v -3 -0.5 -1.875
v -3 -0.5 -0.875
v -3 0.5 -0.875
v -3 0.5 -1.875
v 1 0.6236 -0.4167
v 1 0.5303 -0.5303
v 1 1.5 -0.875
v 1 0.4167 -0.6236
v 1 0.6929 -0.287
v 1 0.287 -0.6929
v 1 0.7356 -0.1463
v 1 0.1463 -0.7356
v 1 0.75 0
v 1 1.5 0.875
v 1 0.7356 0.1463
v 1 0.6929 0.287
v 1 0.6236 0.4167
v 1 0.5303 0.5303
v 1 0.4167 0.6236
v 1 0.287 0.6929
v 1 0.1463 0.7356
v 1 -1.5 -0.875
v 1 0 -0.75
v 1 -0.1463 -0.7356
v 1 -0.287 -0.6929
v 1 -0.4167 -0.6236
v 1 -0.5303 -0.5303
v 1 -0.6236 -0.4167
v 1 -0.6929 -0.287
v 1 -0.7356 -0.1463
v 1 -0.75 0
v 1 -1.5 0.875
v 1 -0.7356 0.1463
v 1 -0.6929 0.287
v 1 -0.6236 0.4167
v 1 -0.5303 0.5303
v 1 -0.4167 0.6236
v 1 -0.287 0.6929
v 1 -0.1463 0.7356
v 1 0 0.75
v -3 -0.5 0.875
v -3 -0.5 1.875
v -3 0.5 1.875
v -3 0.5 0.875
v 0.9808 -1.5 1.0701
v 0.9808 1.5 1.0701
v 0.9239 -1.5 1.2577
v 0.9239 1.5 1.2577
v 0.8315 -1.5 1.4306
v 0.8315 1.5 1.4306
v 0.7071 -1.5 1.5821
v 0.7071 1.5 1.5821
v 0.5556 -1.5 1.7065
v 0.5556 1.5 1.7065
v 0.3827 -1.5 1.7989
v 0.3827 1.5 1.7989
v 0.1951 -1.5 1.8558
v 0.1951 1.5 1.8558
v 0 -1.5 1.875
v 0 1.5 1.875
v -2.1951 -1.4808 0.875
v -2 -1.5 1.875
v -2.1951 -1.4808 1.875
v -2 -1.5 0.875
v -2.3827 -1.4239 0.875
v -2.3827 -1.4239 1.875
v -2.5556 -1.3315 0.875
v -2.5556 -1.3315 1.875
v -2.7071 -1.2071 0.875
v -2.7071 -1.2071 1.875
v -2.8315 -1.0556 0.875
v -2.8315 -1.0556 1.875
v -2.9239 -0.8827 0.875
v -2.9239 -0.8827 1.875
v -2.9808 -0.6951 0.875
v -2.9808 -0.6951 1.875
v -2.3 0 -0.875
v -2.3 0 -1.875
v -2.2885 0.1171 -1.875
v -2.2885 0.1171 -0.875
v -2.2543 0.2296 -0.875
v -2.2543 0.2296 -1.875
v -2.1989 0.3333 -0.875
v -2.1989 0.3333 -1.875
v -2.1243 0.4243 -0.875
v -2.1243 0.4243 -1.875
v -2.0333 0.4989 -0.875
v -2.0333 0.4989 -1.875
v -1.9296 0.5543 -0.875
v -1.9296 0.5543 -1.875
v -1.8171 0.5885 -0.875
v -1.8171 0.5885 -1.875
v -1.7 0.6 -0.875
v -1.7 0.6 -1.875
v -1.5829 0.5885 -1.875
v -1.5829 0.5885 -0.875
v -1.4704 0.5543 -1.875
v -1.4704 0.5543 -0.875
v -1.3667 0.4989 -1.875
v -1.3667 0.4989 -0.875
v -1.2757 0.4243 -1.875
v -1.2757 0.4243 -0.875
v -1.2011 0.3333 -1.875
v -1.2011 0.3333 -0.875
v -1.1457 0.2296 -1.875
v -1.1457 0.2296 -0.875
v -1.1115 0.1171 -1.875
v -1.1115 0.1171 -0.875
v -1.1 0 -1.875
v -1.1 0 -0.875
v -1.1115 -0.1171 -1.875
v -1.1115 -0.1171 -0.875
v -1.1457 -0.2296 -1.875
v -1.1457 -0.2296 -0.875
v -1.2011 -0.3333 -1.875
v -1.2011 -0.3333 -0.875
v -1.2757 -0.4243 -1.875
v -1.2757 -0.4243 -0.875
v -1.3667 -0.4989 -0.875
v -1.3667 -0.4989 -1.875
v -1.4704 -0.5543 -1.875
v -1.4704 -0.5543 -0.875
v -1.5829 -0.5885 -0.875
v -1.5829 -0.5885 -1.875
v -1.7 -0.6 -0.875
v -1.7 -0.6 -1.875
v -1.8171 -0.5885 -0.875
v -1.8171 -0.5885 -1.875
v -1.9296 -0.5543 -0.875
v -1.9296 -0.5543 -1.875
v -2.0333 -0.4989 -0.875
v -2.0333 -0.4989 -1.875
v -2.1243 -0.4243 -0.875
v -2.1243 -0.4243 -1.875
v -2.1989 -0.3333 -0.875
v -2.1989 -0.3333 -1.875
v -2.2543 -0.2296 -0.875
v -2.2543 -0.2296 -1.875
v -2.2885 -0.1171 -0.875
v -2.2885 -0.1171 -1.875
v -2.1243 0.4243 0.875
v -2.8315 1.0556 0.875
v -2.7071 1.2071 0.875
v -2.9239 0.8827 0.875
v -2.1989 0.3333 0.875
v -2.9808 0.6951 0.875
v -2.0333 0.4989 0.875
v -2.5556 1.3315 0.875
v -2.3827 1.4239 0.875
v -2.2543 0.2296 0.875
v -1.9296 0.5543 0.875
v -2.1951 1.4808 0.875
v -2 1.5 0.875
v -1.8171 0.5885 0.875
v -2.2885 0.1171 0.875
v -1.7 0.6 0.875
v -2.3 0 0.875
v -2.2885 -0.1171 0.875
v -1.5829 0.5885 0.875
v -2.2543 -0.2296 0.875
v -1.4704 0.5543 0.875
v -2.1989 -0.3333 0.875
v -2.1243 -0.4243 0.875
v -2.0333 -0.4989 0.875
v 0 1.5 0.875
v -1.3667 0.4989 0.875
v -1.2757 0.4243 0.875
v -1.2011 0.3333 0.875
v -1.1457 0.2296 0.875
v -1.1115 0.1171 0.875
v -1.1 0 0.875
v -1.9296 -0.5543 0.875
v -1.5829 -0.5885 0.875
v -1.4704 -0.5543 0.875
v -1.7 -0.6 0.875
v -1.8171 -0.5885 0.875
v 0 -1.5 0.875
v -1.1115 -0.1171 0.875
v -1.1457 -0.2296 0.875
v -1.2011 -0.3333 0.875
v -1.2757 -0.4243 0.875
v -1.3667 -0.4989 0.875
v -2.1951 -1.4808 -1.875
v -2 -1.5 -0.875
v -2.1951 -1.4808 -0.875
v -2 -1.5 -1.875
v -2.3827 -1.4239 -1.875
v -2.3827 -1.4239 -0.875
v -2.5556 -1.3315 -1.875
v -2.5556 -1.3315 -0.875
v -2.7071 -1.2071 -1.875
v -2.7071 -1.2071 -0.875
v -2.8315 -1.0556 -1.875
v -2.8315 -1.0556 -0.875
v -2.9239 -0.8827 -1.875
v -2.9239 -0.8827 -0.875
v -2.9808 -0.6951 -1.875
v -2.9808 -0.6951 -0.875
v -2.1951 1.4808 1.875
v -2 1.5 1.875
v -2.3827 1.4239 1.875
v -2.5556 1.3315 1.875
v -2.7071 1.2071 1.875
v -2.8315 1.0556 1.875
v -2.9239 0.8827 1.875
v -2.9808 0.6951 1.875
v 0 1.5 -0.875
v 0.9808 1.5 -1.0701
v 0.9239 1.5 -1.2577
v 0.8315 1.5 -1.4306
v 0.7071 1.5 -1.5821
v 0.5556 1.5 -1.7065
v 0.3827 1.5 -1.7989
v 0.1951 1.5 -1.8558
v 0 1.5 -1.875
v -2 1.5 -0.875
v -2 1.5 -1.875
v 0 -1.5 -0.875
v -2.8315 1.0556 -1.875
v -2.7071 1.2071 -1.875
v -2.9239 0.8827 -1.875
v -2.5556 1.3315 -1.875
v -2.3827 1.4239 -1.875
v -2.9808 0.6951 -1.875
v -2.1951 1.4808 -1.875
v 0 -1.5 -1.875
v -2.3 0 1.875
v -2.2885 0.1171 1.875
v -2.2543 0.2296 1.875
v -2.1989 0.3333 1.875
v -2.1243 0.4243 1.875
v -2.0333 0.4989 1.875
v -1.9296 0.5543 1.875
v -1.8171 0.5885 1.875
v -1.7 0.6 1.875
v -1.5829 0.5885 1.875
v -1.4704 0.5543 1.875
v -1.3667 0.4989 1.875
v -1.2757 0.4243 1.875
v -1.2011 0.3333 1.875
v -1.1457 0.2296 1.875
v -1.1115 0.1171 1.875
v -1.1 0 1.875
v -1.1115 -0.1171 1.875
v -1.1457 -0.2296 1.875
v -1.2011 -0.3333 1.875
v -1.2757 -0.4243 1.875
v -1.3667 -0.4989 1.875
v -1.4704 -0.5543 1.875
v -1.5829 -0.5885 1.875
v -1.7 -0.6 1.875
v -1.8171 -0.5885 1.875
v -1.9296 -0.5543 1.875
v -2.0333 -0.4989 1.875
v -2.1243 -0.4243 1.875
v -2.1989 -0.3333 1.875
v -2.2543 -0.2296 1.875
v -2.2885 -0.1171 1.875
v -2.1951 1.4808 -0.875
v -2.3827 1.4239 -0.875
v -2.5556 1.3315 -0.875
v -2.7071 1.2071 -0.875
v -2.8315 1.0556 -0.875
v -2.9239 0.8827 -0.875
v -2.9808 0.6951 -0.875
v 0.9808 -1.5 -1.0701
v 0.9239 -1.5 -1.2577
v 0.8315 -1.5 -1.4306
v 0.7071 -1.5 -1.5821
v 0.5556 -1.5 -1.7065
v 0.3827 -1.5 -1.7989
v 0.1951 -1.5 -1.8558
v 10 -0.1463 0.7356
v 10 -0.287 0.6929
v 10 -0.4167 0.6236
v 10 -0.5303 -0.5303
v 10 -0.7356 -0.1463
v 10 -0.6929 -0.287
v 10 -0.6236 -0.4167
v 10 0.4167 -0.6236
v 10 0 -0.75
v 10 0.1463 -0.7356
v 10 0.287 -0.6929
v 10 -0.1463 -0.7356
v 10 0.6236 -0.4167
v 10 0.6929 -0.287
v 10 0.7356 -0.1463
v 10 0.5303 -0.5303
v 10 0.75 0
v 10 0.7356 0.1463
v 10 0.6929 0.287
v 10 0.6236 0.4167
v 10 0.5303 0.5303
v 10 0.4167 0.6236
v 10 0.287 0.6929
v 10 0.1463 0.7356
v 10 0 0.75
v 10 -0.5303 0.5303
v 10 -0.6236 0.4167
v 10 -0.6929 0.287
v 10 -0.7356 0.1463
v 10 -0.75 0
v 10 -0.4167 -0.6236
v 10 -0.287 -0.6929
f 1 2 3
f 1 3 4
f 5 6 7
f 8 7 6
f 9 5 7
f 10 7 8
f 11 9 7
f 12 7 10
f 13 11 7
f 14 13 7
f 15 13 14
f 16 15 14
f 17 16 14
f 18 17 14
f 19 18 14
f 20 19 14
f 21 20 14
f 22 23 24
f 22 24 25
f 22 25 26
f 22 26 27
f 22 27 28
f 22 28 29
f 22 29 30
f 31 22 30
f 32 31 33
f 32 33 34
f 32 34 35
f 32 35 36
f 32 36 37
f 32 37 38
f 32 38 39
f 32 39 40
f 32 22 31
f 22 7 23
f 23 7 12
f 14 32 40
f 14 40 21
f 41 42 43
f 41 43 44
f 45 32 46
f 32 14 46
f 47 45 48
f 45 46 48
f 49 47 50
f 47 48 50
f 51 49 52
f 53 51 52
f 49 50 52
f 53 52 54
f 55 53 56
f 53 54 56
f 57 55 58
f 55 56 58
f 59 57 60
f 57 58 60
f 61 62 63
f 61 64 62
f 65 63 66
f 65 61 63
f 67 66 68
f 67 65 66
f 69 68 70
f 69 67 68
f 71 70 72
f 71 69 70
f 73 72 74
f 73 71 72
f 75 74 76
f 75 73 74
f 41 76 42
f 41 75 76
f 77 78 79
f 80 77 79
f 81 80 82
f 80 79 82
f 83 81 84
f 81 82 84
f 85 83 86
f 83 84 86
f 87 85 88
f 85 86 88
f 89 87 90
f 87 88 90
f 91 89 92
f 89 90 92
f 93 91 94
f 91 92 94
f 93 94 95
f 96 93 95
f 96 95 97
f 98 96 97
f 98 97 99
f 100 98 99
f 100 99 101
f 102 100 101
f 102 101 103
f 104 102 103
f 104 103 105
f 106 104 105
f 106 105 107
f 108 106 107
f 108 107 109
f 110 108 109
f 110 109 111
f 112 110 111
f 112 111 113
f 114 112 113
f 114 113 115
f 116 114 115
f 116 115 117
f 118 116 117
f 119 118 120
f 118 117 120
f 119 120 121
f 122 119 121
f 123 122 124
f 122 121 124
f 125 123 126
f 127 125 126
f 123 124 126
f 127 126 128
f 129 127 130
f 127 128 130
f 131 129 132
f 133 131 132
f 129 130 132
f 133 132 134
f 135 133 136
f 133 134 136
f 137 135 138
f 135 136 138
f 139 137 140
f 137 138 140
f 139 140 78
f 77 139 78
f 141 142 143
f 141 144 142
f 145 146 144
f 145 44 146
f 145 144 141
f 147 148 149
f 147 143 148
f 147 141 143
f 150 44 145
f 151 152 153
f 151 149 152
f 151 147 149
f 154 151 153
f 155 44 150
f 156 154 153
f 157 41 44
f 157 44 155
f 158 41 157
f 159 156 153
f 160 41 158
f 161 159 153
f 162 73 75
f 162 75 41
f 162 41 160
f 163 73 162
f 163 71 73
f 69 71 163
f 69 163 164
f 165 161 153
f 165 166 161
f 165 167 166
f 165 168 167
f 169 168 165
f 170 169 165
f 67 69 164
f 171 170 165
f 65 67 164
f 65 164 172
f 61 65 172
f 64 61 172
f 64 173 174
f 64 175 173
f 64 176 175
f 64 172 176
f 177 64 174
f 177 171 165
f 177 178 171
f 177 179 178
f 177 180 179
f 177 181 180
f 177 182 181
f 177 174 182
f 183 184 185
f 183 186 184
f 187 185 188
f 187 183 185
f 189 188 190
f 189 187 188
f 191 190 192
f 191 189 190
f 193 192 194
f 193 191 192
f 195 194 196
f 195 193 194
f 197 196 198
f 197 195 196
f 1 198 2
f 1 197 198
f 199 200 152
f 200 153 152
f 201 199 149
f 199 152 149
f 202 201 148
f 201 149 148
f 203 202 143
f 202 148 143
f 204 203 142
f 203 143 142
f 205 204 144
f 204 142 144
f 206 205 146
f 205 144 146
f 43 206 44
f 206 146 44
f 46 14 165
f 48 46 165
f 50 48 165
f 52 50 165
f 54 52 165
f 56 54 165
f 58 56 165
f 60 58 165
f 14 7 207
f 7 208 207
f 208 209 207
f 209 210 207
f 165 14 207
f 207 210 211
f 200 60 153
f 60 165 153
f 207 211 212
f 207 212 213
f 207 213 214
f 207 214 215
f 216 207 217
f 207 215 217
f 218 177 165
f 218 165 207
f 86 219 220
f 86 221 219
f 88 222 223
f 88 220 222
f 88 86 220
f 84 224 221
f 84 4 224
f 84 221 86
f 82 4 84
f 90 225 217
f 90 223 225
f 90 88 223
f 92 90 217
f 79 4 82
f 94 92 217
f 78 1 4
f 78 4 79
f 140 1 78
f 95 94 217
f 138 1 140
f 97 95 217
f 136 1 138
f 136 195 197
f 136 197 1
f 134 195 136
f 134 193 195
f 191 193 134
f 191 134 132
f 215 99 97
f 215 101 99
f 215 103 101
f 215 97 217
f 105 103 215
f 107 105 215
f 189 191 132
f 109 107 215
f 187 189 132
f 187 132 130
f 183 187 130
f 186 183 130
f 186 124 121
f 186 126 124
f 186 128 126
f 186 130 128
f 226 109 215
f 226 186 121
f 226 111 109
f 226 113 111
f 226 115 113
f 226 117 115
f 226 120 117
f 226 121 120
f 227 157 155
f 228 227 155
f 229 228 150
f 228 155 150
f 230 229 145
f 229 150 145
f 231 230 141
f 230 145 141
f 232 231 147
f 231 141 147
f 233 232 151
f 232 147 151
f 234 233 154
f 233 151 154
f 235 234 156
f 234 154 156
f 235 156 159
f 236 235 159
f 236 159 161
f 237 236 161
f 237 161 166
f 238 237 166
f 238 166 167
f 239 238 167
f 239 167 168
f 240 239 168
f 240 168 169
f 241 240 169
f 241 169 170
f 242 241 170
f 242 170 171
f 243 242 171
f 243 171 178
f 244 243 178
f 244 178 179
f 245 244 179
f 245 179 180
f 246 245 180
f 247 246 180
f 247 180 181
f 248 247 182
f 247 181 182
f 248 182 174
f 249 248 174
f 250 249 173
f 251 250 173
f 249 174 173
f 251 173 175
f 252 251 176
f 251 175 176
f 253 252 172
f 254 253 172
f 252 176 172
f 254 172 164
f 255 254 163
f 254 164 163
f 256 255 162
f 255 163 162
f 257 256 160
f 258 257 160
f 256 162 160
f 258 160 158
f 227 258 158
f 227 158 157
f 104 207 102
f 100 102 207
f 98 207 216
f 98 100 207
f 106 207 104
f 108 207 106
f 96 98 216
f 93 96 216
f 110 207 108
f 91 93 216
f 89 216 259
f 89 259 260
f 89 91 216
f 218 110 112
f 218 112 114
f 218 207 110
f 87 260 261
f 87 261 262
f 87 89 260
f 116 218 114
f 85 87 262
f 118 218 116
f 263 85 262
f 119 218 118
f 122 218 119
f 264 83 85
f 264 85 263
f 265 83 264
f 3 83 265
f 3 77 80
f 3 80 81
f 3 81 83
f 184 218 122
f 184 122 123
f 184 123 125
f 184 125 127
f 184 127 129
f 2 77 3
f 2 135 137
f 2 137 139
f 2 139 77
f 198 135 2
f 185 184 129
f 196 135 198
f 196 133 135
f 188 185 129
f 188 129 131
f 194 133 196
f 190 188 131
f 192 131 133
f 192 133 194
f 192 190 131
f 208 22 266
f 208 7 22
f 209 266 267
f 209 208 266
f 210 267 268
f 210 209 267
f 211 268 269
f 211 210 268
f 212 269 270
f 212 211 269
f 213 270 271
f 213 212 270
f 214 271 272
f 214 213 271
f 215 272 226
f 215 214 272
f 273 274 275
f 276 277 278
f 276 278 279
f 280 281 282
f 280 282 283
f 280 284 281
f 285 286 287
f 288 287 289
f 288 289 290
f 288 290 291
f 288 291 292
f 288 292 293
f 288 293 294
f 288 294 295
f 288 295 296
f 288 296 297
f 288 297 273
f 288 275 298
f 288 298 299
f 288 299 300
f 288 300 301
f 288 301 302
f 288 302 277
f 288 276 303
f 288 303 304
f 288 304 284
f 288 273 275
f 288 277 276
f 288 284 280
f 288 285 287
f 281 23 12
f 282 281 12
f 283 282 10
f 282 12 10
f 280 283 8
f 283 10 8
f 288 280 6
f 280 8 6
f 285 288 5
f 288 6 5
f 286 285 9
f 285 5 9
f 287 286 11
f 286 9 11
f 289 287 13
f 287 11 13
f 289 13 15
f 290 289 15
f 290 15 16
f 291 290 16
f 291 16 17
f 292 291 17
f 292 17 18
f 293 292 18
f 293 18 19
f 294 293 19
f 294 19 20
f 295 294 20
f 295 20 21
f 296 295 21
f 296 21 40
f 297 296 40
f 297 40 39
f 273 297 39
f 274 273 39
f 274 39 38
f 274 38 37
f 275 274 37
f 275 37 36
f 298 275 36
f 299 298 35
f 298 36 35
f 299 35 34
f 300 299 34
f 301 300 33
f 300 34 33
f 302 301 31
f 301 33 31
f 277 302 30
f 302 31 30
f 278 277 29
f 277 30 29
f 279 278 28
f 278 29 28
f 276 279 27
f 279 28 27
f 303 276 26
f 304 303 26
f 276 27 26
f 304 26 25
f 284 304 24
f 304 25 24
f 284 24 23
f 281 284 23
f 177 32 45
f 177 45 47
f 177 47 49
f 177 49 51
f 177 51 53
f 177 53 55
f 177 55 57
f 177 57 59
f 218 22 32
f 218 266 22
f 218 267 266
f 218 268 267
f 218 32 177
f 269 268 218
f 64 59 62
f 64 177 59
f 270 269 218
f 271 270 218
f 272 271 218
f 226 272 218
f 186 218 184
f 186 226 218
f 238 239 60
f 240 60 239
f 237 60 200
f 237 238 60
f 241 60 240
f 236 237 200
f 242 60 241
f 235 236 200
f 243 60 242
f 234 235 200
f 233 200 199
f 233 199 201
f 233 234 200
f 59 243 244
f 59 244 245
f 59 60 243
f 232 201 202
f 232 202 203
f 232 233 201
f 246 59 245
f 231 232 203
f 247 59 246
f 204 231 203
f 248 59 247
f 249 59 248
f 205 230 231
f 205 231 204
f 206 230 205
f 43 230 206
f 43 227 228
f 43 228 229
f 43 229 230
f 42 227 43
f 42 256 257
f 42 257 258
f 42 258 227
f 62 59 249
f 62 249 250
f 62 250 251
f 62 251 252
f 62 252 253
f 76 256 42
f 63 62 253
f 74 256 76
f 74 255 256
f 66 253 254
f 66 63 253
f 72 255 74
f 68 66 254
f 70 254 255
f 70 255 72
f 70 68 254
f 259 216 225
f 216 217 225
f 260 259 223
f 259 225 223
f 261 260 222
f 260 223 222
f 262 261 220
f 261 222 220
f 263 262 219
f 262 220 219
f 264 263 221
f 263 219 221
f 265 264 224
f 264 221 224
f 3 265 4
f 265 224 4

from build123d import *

# Parameters (mm, degrees)
SKETCH1_R                = 0.75
BOSS_EXTRUDE1_DEPTH      = 10
BOSS_EXTRUDE2_DEPTH      = 1.5
BOSS_EXTRUDE2_DEPTH_BACK = 1.5
FILLET1_R                = 1
SKETCH3_R                = 0.6
CUT_EXTRUDE1_DEPTH       = 5


with BuildPart() as part:
    # Sketch1 → Boss-Extrude1 (new body)
    with BuildSketch(Plane(origin=(0, 0, 0), x_dir=(0, 0, -1), z_dir=(1, 0, 0))):
        Circle(SKETCH1_R)
    extrude(amount=BOSS_EXTRUDE1_DEPTH)

    # Sketch2 → Boss-Extrude2 (add, two sides: drawn at the far end of the back side and taken through both)
    with BuildSketch(Plane(origin=(0, 0, 0), x_dir=(1, 0, 0), z_dir=(0, 1, 0)).offset(-BOSS_EXTRUDE2_DEPTH_BACK)):
        Polygon((1, 1.875), (1, -1.875), (-3, -1.875), (-3, -0.875), (0, -0.875), (0, 0.875), (-3, 0.875), (-3, 1.875), align=None)
    extrude(amount=BOSS_EXTRUDE2_DEPTH + BOSS_EXTRUDE2_DEPTH_BACK)

    # Fillet1
    fillet1_edges = [part.edges().sort_by_distance(p)[0] for p in [
        (-3, 1.5, 1.375),
        (-3, 1.5, -1.375),
        (-3, -1.5, -1.375),
        (1, 0, -1.875),
        (1, 0, 1.875),
        (-3, -1.5, 1.375),
    ]]
    fillet(fillet1_edges, radius=FILLET1_R)

    # Sketch3 → Cut-Extrude1 (cut)
    with BuildSketch(Plane(origin=(0, 0, -1.875), x_dir=(-1, 0, 0), z_dir=(0, 0, -1))):
        with Locations((1.7, 0)):
            Circle(SKETCH3_R)
    extrude(amount=-CUT_EXTRUDE1_DEPTH, mode=Mode.SUBTRACT)


solid = part.part
